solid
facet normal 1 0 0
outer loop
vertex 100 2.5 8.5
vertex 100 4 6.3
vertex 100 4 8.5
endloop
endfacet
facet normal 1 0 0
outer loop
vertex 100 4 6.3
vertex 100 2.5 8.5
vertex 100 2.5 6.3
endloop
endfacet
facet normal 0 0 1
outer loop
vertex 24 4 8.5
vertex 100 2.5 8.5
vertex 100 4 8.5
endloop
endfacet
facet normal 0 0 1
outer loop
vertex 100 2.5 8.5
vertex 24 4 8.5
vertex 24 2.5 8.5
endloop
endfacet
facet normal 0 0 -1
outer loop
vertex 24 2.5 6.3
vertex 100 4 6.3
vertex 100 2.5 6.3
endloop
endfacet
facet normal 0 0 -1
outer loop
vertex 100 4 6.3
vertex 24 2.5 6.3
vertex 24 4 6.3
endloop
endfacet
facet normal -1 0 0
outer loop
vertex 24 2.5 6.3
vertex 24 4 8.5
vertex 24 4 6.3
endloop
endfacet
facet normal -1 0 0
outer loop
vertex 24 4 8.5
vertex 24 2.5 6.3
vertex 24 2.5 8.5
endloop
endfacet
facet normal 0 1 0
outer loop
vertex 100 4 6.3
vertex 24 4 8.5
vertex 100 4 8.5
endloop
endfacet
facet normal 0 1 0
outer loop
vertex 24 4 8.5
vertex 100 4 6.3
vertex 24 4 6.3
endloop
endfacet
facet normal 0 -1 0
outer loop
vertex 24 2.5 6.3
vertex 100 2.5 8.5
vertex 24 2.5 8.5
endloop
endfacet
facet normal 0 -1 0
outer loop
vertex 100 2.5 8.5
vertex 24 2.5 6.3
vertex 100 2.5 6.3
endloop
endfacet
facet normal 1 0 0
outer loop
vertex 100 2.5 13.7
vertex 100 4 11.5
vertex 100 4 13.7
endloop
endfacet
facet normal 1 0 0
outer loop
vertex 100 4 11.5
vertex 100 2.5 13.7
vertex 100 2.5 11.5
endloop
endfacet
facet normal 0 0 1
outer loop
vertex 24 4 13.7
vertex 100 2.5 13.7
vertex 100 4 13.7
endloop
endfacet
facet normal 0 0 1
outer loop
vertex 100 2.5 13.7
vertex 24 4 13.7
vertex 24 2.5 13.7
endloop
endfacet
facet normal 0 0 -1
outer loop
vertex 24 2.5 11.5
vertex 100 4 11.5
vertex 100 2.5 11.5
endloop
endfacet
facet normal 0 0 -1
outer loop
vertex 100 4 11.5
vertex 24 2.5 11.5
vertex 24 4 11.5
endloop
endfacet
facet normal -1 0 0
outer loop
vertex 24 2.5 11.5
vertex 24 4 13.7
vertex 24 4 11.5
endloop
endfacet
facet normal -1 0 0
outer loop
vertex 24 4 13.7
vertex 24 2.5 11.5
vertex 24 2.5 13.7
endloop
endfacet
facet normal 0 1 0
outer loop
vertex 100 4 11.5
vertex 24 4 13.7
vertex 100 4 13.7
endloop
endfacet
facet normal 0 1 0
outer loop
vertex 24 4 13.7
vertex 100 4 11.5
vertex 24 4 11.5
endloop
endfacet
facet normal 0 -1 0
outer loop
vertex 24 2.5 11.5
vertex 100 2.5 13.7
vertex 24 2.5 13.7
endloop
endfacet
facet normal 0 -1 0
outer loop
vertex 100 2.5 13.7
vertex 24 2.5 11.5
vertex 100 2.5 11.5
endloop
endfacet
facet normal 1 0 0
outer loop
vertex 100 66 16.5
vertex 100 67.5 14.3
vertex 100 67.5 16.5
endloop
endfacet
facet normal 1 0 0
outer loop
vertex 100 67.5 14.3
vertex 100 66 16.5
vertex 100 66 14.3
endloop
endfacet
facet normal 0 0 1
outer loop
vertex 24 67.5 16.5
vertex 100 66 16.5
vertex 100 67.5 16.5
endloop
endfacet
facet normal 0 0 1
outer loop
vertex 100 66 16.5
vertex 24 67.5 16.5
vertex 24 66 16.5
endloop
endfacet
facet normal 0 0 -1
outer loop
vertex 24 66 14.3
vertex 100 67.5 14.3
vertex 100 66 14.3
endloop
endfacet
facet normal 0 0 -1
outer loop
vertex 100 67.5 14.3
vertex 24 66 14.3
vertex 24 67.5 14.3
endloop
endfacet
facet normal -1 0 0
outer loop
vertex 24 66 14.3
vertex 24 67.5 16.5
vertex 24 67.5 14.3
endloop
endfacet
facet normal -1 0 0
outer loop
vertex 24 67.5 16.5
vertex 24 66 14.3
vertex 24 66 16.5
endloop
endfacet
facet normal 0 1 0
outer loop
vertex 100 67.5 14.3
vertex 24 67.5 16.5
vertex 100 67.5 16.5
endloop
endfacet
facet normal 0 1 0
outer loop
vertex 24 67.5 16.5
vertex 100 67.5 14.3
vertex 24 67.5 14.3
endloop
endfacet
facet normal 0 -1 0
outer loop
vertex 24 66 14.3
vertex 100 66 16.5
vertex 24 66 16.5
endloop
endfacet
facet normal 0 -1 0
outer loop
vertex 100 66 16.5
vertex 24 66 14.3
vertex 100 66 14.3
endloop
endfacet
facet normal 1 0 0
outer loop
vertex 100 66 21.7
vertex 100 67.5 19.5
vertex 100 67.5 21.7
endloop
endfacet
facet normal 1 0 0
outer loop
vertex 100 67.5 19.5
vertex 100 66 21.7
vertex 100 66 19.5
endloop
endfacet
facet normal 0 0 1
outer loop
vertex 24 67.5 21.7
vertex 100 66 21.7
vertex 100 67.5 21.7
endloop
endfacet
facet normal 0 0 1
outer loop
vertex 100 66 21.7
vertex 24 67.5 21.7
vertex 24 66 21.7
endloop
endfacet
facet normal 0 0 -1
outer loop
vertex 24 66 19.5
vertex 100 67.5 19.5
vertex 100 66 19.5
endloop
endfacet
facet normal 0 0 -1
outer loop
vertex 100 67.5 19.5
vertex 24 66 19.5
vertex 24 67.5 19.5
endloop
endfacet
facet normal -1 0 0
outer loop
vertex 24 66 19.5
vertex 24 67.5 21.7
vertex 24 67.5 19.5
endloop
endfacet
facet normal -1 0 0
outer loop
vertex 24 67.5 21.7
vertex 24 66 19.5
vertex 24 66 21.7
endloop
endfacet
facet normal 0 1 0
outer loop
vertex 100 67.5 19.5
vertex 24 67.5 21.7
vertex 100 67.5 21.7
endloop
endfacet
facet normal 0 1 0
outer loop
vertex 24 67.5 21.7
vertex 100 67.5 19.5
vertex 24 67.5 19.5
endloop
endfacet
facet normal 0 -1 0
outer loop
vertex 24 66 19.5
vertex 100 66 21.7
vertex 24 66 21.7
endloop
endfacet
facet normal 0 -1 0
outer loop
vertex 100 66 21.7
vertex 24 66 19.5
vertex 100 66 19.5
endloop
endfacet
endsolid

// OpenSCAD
// file: ../../00_common/parameters.scad
// =============================================================================
// OpenMotorBridge - Global CAD Parameters & Settings
// =============================================================================
// File: hardware/cad/scad/00_common/parameters.scad
// Description: Global dimensional constants, manufacturing clearances and
//              circle resolution ($fn) for all OpenSCAD modules.
// =============================================================================

// --- 1. Circle & Curve Resolution ---
$fn = 60; // Smooth cylinders and holes for high-quality MJF 3D printing

// --- 2. Central Main Box Dimensions (3-Tier Sandwich) ---
MAIN_BOX_OUTER_L      = 110.0; // Outer length in X (mm)
MAIN_BOX_OUTER_W      = 74.0;  // Outer width in Y (mm)
MAIN_BOX_LOWER_H      = 17.0;  // Lower case height in Z (mm)
MAIN_BOX_MID_H        = 15.0;  // Mid tray height in Z (mm)
MAIN_BOX_LID_H        = 4.0;   // Lid plate thickness in Z (mm)
MAIN_BOX_WALL         = 2.5;   // Nominal wall thickness (mm)
MAIN_BOX_CORNER_POST  = 7.0;   // Corner clamping screw post size (mm, for M3 hex nut pockets)

// --- 3. Satellite Pod Dimensions (Universal Enlarged Envelope) ---
POD_OUTER_L           = 135.0; // Outer length in X (mm)
POD_OUTER_W           = 70.0;  // Outer width in Y (mm)
POD_OUTER_H           = 38.0;  // Outer height in Z (mm)
POD_WALL              = 3.5;   // Nominal wall thickness (mm)
POD_BULKHEAD_X        = 18.0;  // Partition bulkhead position in X (mm)
POD_CHAMBER_L         = 117.0; // Sliding chamber length in X (mm)
POD_CHAMBER_W         = 63.0;  // Sliding chamber width in Y (mm)
POD_CHAMBER_H         = 31.0;  // Sliding chamber height in Z (mm)

// --- 4. Pod Linear Guide Rails (Poka-Yoke Tongue & Groove) ---
POD_GROOVE_W          = 3.0;   // Internal guide groove width in Z (mm)
POD_GROOVE_DEPTH      = 1.5;   // Internal guide groove depth in Y (mm)
POD_GROOVE_LEFT_Z     = 10.0;  // Center height of left groove (mm)
POD_GROOVE_RIGHT_Z    = 18.0;  // Center height of right groove (mm, asym offset)

CARTRIDGE_TONGUE_W    = 2.6;   // Cartridge tongue rail height in Z (mm, 0.2mm clearance)
CARTRIDGE_TONGUE_PROT = 1.4;   // Cartridge tongue protrusion in Y (mm, 0.1mm clearance)
CARTRIDGE_CHAMFER_L   = 4.0;   // 30° lead-in chamfer nose length (mm)

// --- 5. Cartridge Dimensions (Enlarged Universal Sled) ---
CARTRIDGE_BASE_L      = 116.0; // Sled length in X (mm)
CARTRIDGE_BASE_W      = 58.0;  // Sled width in Y (mm)
CARTRIDGE_BASE_H      = 28.0;  // Sled height in Z (mm)
CARTRIDGE_FACE_L      = 4.0;   // Front faceplate thickness in X (mm)
CARTRIDGE_FACE_W      = 64.0;  // Front faceplate width in Y (mm)
CARTRIDGE_FACE_H      = 34.0;  // Front faceplate height in Z (mm)

// --- 5a. RF Interface & Sealing Dimensions ---
SMA_BORE_R            = 3.25;  // Ø 6.5 mm through-hole for standard SMA bulkhead
SMA_ORECESS_R         = 4.75;  // Ø 9.5 mm recess for waterproof silicone O-ring
SMA_ORECESS_DEPTH     = 1.2;   // 1.2 mm deep O-ring compression pocket

// --- 5b. Magnetic Anti-Theft Lock System ---
LATCH_PIVOT_X         = 58.0;  // Center pivot position along sled X (mm)
LATCH_MAGNET_X        = 46.0;  // Ferromagnetic anchor position along sled X (mm)
LATCH_TOOTH_X         = 70.0;  // Locking sawtooth pawl position along sled X (mm)
LATCH_ARM_H           = 6.0;   // Rocker lever height in Z (mm)
LATCH_ARM_THICK       = 2.6;   // Rocker beam thickness in Y (mm)
LATCH_MAGNET_PIN_DIA  = 6.2;   // Bore for Ø 6.0 mm steel dowel pin (mm)
LATCH_SPRING_DIA      = 3.8;   // Bore for Ø 3.5 mm return compression spring (mm)

// --- 6. Standard Captive Hex Nut Pockets (DIN 934 / DIN 985 with +0.2 mm MJF/FDM clearance) ---
NUT_M2_SW             = 4.2;   // M2 across flats (nominal 4.0 mm)
NUT_M2_H              = 1.8;   // M2 thickness (nominal 1.6 mm)
NUT_M2_5_SW           = 5.2;   // M2.5 across flats (nominal 5.0 mm)
NUT_M2_5_H            = 2.2;   // M2.5 thickness (nominal 2.0 mm)
NUT_M3_SW             = 5.7;   // M3 across flats (nominal 5.5 mm)
NUT_M3_H              = 2.6;   // M3 thickness (nominal 2.4 mm)
NUT_M4_SW             = 7.2;   // M4 across flats (nominal 7.0 mm)
NUT_M4_H              = 3.4;   // M4 thickness (nominal 3.2 mm)
NUT_M5_SW             = 8.2;   // M5 across flats (nominal 8.0 mm)
NUT_M5_H              = 4.2;   // M5 thickness (nominal 4.0 mm)

// Direct Plastic Thread-Forming / Self-Tapping Pilot Holes in PA12 (100% Soldering-Iron Free)
M2_PILOT_HOLE_R       = 0.85;  // Core hole for M2 screws in PA12 (Ø 1.7 mm)
M2_5_PILOT_HOLE_R     = 1.05;  // Core hole for M2.5 screws in PA12 (Ø 2.1 mm)
M3_PILOT_HOLE_R       = 1.25;  // Core hole for M3 screws in PA12 (Ø 2.5 mm)

// --- 7. Screw & Clearance Dimensions ---
M2_SCREW_HOLE_R       = 1.1;   // M2 clearance hole (r = 1.1 mm -> Ø 2.2 mm)
M2_5_SCREW_HOLE_R     = 1.4;   // M2.5 clearance hole (r = 1.4 mm -> Ø 2.8 mm)
M3_SCREW_HOLE_R       = 1.65;  // M3 clearance hole (r = 1.65 mm -> Ø 3.3 mm)
M4_SCREW_HOLE_R       = 2.2;   // M4 clearance hole (r = 2.2 mm -> Ø 4.4 mm)
M8_BORE_R             = 4.0;   // M8 cable through-bore (r = 4.0 mm -> Ø 8.0 mm)
M8_STUDS_OUTER_R      = 6.0;   // M8 neck outer radius (Ø 12.0 mm)

// --- 8. Universal Front Node Enclosure Dimensions (Type E: 98 x 68 x 25 mm) ---
FRONT_NODE_PCB_L      = 82.0;  // PCB length in X (mm, PCBA 05)
FRONT_NODE_PCB_W      = 50.0;  // PCB width in Y (mm, PCBA 05)
FRONT_NODE_PCB_H      = 1.6;   // PCB thickness in Z (mm)
FRONT_NODE_PCB_R      = 2.5;   // PCB corner radius (mm)

FRONT_NODE_CHAMBER_L  = 86.0;  // Internal chamber length in X (mm, 2mm margin per side)
FRONT_NODE_CHAMBER_W  = 56.0;  // Internal chamber width in Y (mm, 3mm margin per side)
FRONT_NODE_TUB_H      = 17.5;  // Lower tub depth in Z (mm)
FRONT_NODE_LID_H      = 7.5;   // Upper lid height in Z (mm)
FRONT_NODE_WALL       = 2.5;   // Wall thickness in HP MJF PA12 (mm)
FRONT_NODE_CORNER_R   = 4.0;   // Outer enclosure corner radius (mm)

FRONT_NODE_OUTER_L    = FRONT_NODE_CHAMBER_L + 2 * FRONT_NODE_WALL + 7.0; // 98.0 mm
FRONT_NODE_OUTER_W    = FRONT_NODE_CHAMBER_W + 2 * FRONT_NODE_WALL + 7.0; // 68.0 mm
FRONT_NODE_OUTER_H    = FRONT_NODE_TUB_H + FRONT_NODE_LID_H;              // 25.0 mm

// PCB Standoff Heights & Radii (100% Soldering-Iron Free)
FRONT_NODE_STANDOFF_H = 3.0;   // Height of PCB standoffs from floor (mm)
FRONT_NODE_STANDOFF_R = 3.0;   // Outer radius of M2.5 screw bosses (mm)
FRONT_NODE_CORE_HOLE_R= M2_5_PILOT_HOLE_R; // Core hole for direct M2.5 screw engagement (Ø 2.1 mm)

// AMPS 4-Hole Mounting Pattern (38 x 30 mm with DIN 934 M4 Captive Nut Pockets)
AMPS_SPACING_X        = 38.0;  // AMPS hole distance in X (mm)
AMPS_SPACING_Y        = 30.0;  // AMPS hole distance in Y (mm)
AMPS_NUT_SW           = NUT_M4_SW; // Captive M4 hex nut pocket across flats (7.2 mm)
AMPS_NUT_H            = NUT_M4_H;  // Captive M4 hex nut pocket depth (3.4 mm)

// Acoustic Vent for Knowles SPH0645 MEMS
FRONT_NODE_MIC_HOLE_R = 1.25;  // Sound canal radius (Ø 2.5 mm)
FRONT_NODE_MIC_MEMB_R = 3.0;   // Gore ePTFE membrane pocket radius (Ø 6.0 mm)
FRONT_NODE_MIC_MEMB_D = 0.8;   // Membrane pocket depth (mm)
// main file
// =============================================================================
// OpenMotorBridge - Satellite Pod: Poka-Yoke Internal Guide Grooves (Nuten)
// =============================================================================
// File: hardware/cad/scad/02_pod_base/parts/003_pod_guide_grooves.scad
// =============================================================================

include <../../00_common/parameters.scad>;

// 1. Internal Guide Ribs (Added along inside tunnel walls to form the 3.0mm guide grooves)
module pod_internal_guide_ribs(start_x=24.0, length=76.0, wall=2.5) {
    // --- Left Side Wall (y = wall = 2.5 mm) ---
    // Lower left rib (z = 4.5 .. 6.7 mm)
    translate([start_x, wall, POD_GROOVE_LEFT_Z - POD_GROOVE_W/2.0 - 2.2])
        cube(size=[length, POD_GROOVE_DEPTH, 2.2], center=false);

    // Upper left rib (z = 9.7 .. 11.9 mm) -> Forms 3.0 mm groove at z = 6.7 .. 9.7 mm (center z = 8.2 mm)
    translate([start_x, wall, POD_GROOVE_LEFT_Z + POD_GROOVE_W/2.0])
        cube(size=[length, POD_GROOVE_DEPTH, 2.2], center=false);

    // --- Right Side Wall (y = POD_OUTER_W - wall - POD_GROOVE_DEPTH = 56.0 mm) ---
    // Lower right rib (z = 10.5 .. 12.7 mm)
    translate([start_x, POD_OUTER_W - wall - POD_GROOVE_DEPTH, POD_GROOVE_RIGHT_Z - POD_GROOVE_W/2.0 - 2.2])
        cube(size=[length, POD_GROOVE_DEPTH, 2.2], center=false);

    // Upper right rib (z = 15.7 .. 17.9 mm) -> Forms 3.0 mm groove at z = 12.7 .. 15.7 mm (center z = 14.2 mm)
    translate([start_x, POD_OUTER_W - wall - POD_GROOVE_DEPTH, POD_GROOVE_RIGHT_Z + POD_GROOVE_W/2.0])
        cube(size=[length, POD_GROOVE_DEPTH, 2.2], center=false);
}

// 2. Guide Groove Cutout Tool (Alternative subtractive approach for Tinkercad/CSG boolean)
module pod_internal_guide_grooves_tool(start_x=22.0, length=78.0) {
    // Left Groove Tool (3.0 mm width at z = 6.7 .. 9.7 mm)
    translate([start_x, 1.0, POD_GROOVE_LEFT_Z - POD_GROOVE_W/2.0])
        cube(size=[length, 3.0, POD_GROOVE_W], center=false);

    // Right Groove Tool (3.0 mm width at z = 12.7 .. 15.7 mm)
    translate([start_x, POD_OUTER_W - 4.0, POD_GROOVE_RIGHT_Z - POD_GROOVE_W/2.0])
        cube(size=[length, 3.0, POD_GROOVE_W], center=false);
}

// Standalone preview
pod_internal_guide_ribs();
